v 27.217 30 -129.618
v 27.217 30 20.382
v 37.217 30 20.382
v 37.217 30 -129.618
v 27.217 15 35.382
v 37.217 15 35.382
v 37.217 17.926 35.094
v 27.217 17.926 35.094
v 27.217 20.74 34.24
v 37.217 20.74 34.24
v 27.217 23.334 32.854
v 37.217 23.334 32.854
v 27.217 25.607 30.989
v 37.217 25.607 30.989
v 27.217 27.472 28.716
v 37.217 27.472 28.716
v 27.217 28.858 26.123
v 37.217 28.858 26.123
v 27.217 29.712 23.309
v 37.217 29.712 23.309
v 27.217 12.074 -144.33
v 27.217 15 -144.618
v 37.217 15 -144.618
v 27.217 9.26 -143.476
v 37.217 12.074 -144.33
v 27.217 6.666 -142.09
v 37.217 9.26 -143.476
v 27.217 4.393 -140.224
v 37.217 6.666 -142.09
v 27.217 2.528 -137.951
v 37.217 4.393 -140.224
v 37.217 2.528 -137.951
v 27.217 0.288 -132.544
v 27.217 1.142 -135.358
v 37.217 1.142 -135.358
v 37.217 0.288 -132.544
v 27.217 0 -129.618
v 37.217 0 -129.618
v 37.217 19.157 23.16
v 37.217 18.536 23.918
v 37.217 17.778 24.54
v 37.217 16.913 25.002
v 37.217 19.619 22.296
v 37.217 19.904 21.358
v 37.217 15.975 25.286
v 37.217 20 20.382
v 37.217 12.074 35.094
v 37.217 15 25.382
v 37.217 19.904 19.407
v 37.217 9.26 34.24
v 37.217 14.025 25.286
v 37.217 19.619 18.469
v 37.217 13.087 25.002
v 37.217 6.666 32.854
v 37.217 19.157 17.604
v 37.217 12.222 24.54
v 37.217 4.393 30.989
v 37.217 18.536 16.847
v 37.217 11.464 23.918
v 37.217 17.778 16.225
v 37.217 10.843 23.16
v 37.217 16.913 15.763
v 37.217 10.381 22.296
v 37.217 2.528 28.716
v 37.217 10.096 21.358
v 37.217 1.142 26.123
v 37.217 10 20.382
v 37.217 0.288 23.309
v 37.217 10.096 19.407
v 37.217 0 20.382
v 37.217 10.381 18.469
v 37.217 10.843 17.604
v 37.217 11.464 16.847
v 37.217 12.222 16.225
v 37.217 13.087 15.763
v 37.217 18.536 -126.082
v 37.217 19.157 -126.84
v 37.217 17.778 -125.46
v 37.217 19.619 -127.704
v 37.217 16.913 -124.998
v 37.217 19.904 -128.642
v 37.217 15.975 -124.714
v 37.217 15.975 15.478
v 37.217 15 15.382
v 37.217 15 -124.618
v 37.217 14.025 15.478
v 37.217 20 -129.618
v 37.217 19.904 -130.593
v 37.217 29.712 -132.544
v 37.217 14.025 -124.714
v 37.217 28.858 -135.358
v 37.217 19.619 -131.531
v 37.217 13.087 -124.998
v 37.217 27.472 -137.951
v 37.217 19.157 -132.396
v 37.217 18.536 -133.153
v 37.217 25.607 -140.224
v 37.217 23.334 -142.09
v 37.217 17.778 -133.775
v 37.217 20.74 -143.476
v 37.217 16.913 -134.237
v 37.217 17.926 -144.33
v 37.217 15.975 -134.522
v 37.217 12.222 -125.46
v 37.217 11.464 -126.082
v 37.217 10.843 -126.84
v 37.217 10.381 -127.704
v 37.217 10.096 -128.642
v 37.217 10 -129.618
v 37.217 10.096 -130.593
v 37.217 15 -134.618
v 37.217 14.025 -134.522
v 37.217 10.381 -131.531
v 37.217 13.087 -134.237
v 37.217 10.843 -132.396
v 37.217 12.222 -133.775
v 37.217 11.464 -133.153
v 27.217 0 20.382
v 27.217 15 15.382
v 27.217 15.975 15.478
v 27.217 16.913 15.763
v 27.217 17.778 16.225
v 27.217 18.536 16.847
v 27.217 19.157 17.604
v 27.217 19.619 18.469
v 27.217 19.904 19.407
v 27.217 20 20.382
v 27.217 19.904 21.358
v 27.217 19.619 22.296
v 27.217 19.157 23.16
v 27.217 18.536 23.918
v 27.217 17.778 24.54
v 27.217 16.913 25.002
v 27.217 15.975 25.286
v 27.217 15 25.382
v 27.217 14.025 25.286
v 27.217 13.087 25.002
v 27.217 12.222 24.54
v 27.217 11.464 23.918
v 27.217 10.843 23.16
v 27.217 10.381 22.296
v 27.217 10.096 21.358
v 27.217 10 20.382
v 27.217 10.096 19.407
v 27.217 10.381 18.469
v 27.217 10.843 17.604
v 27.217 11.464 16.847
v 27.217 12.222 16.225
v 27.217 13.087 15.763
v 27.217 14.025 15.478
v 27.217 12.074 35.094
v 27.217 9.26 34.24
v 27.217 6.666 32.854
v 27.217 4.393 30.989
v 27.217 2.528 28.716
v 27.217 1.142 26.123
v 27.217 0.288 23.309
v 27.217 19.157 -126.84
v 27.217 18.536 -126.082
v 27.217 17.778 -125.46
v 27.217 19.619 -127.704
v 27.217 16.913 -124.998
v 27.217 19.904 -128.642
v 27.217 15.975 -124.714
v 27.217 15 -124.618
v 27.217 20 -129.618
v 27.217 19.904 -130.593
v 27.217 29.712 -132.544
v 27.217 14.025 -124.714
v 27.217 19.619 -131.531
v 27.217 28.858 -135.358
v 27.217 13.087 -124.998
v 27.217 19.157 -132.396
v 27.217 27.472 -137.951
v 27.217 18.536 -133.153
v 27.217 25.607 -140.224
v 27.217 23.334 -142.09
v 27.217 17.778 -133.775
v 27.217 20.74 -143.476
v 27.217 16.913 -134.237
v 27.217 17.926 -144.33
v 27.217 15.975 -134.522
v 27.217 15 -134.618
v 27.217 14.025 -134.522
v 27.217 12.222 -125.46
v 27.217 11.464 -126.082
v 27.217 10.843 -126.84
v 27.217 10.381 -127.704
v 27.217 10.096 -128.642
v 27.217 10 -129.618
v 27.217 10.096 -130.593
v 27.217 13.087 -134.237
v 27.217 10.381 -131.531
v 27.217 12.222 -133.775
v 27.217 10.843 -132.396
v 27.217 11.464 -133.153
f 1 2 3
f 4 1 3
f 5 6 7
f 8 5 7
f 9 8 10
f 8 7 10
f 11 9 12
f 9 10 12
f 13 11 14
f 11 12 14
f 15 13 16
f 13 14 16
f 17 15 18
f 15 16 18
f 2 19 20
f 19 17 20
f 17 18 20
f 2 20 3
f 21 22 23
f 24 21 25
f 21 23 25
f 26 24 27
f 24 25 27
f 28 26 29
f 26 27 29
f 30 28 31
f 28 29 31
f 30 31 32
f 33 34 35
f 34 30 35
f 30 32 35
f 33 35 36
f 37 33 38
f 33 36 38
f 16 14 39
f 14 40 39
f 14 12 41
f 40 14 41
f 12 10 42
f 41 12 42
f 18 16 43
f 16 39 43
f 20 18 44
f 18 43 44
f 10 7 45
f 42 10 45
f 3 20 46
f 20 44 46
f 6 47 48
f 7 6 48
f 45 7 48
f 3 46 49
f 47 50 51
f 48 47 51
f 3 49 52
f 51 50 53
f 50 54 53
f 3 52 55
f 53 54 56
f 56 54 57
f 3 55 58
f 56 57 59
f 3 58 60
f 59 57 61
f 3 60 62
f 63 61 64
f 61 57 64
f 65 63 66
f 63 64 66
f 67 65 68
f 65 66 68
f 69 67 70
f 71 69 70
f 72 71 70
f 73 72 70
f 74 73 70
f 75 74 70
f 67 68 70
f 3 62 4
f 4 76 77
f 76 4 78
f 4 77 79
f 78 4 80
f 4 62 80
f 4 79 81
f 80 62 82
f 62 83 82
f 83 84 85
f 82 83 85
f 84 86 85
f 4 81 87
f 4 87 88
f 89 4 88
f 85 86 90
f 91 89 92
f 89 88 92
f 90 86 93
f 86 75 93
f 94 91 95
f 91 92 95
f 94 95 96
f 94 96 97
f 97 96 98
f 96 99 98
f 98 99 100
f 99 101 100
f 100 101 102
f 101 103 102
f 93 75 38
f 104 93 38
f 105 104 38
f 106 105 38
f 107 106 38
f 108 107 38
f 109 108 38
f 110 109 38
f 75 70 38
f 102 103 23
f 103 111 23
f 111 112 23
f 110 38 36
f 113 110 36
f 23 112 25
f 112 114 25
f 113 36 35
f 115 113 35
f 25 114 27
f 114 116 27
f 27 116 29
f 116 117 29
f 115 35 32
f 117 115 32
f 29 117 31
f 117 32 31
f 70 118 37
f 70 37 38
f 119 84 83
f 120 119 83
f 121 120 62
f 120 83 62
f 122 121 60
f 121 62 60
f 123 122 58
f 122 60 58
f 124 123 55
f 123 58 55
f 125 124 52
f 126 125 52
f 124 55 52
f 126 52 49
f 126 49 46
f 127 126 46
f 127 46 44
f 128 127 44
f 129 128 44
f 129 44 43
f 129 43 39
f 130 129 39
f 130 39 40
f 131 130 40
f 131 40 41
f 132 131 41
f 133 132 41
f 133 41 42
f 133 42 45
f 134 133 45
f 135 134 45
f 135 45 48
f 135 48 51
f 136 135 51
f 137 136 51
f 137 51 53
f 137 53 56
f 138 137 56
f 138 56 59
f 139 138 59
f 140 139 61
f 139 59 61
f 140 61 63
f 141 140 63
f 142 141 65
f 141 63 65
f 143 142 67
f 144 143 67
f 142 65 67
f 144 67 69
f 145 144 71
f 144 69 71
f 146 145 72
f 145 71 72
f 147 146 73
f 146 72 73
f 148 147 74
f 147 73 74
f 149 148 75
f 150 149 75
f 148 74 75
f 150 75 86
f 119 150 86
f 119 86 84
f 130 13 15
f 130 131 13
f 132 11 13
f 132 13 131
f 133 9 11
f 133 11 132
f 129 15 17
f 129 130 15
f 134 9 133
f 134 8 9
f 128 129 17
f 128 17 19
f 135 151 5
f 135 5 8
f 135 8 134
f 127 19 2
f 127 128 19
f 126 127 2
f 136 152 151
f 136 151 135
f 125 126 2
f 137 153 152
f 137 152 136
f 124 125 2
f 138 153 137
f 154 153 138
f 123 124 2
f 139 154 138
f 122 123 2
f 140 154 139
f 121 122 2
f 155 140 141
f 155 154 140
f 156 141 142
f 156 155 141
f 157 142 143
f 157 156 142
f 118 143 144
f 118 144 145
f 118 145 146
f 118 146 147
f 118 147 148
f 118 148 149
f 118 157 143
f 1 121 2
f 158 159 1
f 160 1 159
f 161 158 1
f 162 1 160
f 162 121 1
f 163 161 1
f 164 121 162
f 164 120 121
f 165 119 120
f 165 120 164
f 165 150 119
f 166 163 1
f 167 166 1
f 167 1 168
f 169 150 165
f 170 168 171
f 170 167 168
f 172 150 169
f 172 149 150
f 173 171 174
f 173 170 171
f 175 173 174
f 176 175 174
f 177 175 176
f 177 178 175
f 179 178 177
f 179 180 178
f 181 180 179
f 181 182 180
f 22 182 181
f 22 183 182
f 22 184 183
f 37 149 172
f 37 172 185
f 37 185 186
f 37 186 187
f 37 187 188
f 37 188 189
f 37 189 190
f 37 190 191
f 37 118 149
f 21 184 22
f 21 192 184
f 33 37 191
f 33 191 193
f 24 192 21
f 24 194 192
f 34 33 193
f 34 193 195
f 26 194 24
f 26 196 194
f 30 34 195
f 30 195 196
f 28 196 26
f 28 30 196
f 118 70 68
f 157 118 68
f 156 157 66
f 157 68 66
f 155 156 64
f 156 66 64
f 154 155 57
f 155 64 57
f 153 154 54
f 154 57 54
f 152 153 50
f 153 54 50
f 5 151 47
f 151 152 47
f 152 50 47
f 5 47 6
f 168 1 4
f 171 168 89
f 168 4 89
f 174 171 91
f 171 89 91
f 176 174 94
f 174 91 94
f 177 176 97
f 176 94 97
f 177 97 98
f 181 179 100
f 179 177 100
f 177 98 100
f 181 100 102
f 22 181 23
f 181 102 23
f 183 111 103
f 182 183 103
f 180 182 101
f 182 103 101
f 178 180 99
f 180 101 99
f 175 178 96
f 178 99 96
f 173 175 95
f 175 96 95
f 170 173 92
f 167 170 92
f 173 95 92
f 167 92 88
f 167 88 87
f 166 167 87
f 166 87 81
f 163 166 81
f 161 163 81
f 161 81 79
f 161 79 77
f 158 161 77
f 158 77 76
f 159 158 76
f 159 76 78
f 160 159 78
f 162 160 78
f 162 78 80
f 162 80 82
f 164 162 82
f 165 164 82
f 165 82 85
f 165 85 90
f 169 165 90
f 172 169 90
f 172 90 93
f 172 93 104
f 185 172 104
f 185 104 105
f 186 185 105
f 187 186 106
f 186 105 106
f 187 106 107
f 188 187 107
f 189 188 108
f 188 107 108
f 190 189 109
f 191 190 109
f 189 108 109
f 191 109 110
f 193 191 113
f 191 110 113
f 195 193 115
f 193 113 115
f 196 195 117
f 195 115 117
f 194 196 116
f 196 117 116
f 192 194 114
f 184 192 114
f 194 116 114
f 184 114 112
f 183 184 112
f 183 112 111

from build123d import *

# Parameters (mm, degrees)
SKETCH_1_W          = 10
SKETCH_1_H          = 180
EXTRUDE_1_DEPTH     = 30
SKETCH_3_R          = 5
CUT_EXTRUDE_3_DEPTH = 30


with BuildPart() as part:
    # Эскиз1 → Бобышка-Вытянуть1 (new body)
    with BuildSketch(Plane(origin=(0, 0, 0), x_dir=(1, 0, 0), z_dir=(0, 1, 0))):
        with Locations((32.217123935, 54.617723996)):
            Rectangle(SKETCH_1_W, SKETCH_1_H)
    extrude(amount=EXTRUDE_1_DEPTH)

    # Эскиз3 → Вырез-Вытянуть3 (cut)
    with BuildSketch(Plane(origin=(37.217123935, 0, 0), x_dir=(0, 0, -1), z_dir=(1, 0, 0))):
        with BuildLine():
            ThreePointArc((129.617723996, 30), (140.224325714, 25.606601718), (144.617723996, 15))
            Line((144.617723996, 15), (144.617723996, 30))
            Line((144.617723996, 30), (129.617723996, 30))
        make_face()
        with BuildLine():
            Line((129.617723996, 0), (144.617723996, 0))
            Line((144.617723996, 0), (144.617723996, 15))
            ThreePointArc((144.617723996, 15), (140.224325714, 4.393398282), (129.617723996, 0))
        make_face()
        with BuildLine():
            Line((-35.382276004, 0), (-20.382276004, 0))
            ThreePointArc((-20.382276004, 0), (-30.988877721, 4.393398282), (-35.382276004, 15))
            Line((-35.382276004, 15), (-35.382276004, 0))
        make_face()
        with BuildLine():
            ThreePointArc((-35.382276004, 15), (-30.988877721, 25.606601718), (-20.382276004, 30))
            Line((-20.382276004, 30), (-35.382276004, 30))
            Line((-35.382276004, 30), (-35.382276004, 15))
        make_face()
        with Locations((129.617723996, 15)):
            Circle(SKETCH_3_R)
        with Locations((-20.382276004, 15)):
            Circle(SKETCH_3_R)
    extrude(amount=-CUT_EXTRUDE_3_DEPTH, mode=Mode.SUBTRACT)


solid = part.part
